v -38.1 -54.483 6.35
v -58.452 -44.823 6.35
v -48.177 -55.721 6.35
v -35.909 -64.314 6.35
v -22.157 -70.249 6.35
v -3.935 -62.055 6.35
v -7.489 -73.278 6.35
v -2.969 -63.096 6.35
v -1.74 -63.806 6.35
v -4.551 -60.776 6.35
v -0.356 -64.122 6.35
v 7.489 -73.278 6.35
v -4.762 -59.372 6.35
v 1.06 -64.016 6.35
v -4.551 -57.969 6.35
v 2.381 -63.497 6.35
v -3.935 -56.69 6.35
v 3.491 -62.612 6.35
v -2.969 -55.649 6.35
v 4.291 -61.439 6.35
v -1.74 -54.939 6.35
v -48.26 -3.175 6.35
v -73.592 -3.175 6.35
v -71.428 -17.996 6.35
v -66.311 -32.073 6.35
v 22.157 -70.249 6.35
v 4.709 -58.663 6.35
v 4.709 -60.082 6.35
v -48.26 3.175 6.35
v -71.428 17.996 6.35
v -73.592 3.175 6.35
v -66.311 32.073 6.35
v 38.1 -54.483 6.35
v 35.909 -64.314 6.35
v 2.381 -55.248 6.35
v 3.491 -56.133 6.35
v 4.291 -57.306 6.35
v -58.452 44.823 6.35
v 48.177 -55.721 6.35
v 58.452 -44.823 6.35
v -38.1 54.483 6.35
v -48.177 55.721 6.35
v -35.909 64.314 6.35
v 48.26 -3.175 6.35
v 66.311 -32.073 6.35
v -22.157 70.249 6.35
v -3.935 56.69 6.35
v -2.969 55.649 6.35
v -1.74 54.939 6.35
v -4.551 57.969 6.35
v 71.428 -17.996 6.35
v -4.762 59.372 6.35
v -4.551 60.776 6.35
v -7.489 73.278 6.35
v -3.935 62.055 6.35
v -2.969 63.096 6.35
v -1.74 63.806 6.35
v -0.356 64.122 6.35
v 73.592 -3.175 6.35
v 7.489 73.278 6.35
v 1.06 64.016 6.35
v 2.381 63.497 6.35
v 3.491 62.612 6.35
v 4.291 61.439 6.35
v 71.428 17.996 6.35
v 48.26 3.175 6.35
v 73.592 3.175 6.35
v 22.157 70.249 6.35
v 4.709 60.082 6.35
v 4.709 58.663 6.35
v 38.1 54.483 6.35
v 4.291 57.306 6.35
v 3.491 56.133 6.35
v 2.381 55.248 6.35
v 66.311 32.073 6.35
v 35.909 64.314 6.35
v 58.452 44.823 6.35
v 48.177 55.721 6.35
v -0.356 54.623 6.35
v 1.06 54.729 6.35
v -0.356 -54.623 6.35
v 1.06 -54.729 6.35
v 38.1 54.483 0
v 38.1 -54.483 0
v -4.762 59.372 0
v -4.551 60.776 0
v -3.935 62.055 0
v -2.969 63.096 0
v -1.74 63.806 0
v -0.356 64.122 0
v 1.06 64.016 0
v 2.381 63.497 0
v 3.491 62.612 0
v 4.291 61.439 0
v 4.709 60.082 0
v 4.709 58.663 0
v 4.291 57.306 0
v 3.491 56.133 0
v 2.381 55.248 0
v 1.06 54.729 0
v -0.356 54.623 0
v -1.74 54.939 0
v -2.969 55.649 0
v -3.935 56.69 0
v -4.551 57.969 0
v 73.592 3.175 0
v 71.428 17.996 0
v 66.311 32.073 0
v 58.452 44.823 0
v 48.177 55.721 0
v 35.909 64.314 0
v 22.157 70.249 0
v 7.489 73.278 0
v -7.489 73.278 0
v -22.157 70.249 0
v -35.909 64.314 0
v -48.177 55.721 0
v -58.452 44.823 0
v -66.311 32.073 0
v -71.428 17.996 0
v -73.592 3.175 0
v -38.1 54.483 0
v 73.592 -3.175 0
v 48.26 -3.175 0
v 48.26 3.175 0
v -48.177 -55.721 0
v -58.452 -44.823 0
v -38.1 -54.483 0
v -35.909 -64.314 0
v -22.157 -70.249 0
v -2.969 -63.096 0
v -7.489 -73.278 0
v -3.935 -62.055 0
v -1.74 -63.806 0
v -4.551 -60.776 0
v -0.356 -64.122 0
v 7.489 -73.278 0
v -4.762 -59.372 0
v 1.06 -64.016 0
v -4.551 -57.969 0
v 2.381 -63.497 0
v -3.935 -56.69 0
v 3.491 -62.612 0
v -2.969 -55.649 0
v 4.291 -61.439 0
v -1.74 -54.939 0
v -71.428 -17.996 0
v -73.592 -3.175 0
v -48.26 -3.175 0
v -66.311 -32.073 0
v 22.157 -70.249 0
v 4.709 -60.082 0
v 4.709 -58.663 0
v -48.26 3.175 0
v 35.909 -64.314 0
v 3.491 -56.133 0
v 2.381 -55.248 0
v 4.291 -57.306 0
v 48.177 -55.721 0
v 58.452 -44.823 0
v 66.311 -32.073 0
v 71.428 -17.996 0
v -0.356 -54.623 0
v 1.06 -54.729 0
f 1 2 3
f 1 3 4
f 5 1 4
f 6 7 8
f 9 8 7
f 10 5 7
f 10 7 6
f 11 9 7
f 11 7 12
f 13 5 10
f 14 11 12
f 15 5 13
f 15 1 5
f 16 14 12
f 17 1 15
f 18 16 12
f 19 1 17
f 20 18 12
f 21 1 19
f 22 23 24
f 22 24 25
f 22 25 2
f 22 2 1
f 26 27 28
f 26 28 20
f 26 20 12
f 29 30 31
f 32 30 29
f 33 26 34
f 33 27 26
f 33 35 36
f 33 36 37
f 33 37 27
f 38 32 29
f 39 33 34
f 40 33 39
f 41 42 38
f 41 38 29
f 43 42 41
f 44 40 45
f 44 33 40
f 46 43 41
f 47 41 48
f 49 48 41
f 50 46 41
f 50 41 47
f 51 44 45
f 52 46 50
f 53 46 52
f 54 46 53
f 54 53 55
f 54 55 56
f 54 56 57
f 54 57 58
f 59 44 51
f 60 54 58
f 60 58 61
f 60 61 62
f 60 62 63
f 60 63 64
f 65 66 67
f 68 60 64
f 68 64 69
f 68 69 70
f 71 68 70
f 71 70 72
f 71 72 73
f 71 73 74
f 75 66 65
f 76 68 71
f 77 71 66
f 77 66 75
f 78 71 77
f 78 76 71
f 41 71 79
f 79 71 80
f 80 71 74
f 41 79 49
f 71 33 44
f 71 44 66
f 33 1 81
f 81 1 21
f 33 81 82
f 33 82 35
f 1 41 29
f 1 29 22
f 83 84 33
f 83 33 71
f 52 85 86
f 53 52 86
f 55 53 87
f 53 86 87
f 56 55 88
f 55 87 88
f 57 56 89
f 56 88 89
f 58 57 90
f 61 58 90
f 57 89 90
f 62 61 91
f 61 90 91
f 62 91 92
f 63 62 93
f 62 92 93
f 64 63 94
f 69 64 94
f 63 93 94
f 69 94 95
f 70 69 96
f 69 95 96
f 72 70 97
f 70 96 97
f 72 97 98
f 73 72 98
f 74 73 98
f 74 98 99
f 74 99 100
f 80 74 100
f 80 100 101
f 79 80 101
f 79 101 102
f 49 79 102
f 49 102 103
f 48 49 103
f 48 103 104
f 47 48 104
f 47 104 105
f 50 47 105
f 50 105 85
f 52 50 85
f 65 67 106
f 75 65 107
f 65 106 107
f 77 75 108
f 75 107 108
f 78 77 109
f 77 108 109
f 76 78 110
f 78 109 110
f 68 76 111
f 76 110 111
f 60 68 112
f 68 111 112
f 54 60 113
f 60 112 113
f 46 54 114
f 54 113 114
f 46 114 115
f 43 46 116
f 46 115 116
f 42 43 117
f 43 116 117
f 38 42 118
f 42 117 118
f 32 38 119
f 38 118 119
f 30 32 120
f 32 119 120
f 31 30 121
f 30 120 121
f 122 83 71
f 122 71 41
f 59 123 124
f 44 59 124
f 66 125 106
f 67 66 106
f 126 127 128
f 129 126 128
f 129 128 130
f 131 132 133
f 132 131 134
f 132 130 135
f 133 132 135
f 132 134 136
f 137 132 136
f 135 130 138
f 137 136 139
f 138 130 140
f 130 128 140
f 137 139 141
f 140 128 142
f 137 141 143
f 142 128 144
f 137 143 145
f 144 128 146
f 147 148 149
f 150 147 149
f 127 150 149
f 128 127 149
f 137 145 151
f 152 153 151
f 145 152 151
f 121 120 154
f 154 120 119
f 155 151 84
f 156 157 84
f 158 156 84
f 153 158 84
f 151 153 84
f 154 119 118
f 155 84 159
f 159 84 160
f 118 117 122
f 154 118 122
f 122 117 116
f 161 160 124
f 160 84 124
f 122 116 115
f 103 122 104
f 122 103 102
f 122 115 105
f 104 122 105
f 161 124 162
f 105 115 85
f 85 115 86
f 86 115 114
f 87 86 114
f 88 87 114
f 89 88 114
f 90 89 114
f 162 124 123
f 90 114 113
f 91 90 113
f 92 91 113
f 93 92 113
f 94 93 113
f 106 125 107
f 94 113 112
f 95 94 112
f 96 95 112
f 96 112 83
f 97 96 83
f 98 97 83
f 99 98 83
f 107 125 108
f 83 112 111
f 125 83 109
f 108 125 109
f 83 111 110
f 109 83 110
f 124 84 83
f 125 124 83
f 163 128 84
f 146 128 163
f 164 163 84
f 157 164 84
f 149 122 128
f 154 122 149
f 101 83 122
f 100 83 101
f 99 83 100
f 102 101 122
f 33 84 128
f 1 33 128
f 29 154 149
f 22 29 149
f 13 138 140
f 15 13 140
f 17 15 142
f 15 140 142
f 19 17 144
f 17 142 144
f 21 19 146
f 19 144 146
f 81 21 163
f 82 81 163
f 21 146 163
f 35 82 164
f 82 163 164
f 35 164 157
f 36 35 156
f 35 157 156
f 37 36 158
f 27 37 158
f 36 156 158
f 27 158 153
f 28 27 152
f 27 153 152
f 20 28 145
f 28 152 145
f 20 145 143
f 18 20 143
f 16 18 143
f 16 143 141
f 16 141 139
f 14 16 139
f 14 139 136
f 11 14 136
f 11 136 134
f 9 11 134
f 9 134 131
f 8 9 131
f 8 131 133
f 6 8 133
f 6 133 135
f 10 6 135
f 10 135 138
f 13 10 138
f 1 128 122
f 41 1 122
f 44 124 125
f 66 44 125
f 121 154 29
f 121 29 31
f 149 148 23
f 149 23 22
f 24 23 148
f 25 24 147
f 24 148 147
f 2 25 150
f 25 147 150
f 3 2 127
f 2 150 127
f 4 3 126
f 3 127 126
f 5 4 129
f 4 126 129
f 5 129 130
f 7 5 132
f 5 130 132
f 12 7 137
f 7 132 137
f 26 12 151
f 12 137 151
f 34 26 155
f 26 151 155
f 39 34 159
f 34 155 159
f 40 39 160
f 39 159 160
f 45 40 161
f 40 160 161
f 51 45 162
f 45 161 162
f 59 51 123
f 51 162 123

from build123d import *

# Parameters (mm, degrees)
SKETCH1_R           = 73.66
BOSS_EXTRUDE1_DEPTH = 6.35
CUT_EXTRUDE1_DEPTH  = 7.35
SKETCH4_R           = 4.7625
CUT_EXTRUDE2_DEPTH  = 7.35
SKETCH5_W           = 76.2
SKETCH5_H           = 108.966
CUT_EXTRUDE5_DEPTH  = 7.35


with BuildPart() as part:
    # Sketch1 → Boss-Extrude1 (new body)
    with BuildSketch(Plane.XY):
        Circle(SKETCH1_R)
    extrude(amount=BOSS_EXTRUDE1_DEPTH)

    # Sketch2 → Cut-Extrude1 (cut, through all)
    with BuildSketch(Plane(origin=(0, 0, 0), x_dir=(-1, 0, 0), z_dir=(0, 0, -1))):
        Polygon((-48.26, 0), (-48.26, 3.175), (-76.2, 3.175), (-76.2, -3.175), (-48.26, -3.175), align=None)
        Polygon((48.26, -3.175), (48.26, 0), (48.26, 3.175), (76.2, 3.175), (76.2, -3.175), align=None)
    extrude(amount=-CUT_EXTRUDE1_DEPTH, mode=Mode.SUBTRACT)

    # Sketch4 → Cut-Extrude2 (cut, through all)
    with BuildSketch(Plane(origin=(0, 0, 0), x_dir=(-1, 0, 0), z_dir=(0, 0, -1))):
        with Locations((0, -59.3725)):
            Circle(SKETCH4_R)
        with Locations((0, 59.3725)):
            Circle(SKETCH4_R)
    extrude(amount=-CUT_EXTRUDE2_DEPTH, mode=Mode.SUBTRACT)

    # Sketch5 → Cut-Extrude5 (cut, through all)
    with BuildSketch(Plane(origin=(0, 0, 0), x_dir=(-1, 0, 0), z_dir=(0, 0, -1))):
        Rectangle(SKETCH5_W, SKETCH5_H)
    extrude(amount=-CUT_EXTRUDE5_DEPTH, mode=Mode.SUBTRACT)


solid = part.part
